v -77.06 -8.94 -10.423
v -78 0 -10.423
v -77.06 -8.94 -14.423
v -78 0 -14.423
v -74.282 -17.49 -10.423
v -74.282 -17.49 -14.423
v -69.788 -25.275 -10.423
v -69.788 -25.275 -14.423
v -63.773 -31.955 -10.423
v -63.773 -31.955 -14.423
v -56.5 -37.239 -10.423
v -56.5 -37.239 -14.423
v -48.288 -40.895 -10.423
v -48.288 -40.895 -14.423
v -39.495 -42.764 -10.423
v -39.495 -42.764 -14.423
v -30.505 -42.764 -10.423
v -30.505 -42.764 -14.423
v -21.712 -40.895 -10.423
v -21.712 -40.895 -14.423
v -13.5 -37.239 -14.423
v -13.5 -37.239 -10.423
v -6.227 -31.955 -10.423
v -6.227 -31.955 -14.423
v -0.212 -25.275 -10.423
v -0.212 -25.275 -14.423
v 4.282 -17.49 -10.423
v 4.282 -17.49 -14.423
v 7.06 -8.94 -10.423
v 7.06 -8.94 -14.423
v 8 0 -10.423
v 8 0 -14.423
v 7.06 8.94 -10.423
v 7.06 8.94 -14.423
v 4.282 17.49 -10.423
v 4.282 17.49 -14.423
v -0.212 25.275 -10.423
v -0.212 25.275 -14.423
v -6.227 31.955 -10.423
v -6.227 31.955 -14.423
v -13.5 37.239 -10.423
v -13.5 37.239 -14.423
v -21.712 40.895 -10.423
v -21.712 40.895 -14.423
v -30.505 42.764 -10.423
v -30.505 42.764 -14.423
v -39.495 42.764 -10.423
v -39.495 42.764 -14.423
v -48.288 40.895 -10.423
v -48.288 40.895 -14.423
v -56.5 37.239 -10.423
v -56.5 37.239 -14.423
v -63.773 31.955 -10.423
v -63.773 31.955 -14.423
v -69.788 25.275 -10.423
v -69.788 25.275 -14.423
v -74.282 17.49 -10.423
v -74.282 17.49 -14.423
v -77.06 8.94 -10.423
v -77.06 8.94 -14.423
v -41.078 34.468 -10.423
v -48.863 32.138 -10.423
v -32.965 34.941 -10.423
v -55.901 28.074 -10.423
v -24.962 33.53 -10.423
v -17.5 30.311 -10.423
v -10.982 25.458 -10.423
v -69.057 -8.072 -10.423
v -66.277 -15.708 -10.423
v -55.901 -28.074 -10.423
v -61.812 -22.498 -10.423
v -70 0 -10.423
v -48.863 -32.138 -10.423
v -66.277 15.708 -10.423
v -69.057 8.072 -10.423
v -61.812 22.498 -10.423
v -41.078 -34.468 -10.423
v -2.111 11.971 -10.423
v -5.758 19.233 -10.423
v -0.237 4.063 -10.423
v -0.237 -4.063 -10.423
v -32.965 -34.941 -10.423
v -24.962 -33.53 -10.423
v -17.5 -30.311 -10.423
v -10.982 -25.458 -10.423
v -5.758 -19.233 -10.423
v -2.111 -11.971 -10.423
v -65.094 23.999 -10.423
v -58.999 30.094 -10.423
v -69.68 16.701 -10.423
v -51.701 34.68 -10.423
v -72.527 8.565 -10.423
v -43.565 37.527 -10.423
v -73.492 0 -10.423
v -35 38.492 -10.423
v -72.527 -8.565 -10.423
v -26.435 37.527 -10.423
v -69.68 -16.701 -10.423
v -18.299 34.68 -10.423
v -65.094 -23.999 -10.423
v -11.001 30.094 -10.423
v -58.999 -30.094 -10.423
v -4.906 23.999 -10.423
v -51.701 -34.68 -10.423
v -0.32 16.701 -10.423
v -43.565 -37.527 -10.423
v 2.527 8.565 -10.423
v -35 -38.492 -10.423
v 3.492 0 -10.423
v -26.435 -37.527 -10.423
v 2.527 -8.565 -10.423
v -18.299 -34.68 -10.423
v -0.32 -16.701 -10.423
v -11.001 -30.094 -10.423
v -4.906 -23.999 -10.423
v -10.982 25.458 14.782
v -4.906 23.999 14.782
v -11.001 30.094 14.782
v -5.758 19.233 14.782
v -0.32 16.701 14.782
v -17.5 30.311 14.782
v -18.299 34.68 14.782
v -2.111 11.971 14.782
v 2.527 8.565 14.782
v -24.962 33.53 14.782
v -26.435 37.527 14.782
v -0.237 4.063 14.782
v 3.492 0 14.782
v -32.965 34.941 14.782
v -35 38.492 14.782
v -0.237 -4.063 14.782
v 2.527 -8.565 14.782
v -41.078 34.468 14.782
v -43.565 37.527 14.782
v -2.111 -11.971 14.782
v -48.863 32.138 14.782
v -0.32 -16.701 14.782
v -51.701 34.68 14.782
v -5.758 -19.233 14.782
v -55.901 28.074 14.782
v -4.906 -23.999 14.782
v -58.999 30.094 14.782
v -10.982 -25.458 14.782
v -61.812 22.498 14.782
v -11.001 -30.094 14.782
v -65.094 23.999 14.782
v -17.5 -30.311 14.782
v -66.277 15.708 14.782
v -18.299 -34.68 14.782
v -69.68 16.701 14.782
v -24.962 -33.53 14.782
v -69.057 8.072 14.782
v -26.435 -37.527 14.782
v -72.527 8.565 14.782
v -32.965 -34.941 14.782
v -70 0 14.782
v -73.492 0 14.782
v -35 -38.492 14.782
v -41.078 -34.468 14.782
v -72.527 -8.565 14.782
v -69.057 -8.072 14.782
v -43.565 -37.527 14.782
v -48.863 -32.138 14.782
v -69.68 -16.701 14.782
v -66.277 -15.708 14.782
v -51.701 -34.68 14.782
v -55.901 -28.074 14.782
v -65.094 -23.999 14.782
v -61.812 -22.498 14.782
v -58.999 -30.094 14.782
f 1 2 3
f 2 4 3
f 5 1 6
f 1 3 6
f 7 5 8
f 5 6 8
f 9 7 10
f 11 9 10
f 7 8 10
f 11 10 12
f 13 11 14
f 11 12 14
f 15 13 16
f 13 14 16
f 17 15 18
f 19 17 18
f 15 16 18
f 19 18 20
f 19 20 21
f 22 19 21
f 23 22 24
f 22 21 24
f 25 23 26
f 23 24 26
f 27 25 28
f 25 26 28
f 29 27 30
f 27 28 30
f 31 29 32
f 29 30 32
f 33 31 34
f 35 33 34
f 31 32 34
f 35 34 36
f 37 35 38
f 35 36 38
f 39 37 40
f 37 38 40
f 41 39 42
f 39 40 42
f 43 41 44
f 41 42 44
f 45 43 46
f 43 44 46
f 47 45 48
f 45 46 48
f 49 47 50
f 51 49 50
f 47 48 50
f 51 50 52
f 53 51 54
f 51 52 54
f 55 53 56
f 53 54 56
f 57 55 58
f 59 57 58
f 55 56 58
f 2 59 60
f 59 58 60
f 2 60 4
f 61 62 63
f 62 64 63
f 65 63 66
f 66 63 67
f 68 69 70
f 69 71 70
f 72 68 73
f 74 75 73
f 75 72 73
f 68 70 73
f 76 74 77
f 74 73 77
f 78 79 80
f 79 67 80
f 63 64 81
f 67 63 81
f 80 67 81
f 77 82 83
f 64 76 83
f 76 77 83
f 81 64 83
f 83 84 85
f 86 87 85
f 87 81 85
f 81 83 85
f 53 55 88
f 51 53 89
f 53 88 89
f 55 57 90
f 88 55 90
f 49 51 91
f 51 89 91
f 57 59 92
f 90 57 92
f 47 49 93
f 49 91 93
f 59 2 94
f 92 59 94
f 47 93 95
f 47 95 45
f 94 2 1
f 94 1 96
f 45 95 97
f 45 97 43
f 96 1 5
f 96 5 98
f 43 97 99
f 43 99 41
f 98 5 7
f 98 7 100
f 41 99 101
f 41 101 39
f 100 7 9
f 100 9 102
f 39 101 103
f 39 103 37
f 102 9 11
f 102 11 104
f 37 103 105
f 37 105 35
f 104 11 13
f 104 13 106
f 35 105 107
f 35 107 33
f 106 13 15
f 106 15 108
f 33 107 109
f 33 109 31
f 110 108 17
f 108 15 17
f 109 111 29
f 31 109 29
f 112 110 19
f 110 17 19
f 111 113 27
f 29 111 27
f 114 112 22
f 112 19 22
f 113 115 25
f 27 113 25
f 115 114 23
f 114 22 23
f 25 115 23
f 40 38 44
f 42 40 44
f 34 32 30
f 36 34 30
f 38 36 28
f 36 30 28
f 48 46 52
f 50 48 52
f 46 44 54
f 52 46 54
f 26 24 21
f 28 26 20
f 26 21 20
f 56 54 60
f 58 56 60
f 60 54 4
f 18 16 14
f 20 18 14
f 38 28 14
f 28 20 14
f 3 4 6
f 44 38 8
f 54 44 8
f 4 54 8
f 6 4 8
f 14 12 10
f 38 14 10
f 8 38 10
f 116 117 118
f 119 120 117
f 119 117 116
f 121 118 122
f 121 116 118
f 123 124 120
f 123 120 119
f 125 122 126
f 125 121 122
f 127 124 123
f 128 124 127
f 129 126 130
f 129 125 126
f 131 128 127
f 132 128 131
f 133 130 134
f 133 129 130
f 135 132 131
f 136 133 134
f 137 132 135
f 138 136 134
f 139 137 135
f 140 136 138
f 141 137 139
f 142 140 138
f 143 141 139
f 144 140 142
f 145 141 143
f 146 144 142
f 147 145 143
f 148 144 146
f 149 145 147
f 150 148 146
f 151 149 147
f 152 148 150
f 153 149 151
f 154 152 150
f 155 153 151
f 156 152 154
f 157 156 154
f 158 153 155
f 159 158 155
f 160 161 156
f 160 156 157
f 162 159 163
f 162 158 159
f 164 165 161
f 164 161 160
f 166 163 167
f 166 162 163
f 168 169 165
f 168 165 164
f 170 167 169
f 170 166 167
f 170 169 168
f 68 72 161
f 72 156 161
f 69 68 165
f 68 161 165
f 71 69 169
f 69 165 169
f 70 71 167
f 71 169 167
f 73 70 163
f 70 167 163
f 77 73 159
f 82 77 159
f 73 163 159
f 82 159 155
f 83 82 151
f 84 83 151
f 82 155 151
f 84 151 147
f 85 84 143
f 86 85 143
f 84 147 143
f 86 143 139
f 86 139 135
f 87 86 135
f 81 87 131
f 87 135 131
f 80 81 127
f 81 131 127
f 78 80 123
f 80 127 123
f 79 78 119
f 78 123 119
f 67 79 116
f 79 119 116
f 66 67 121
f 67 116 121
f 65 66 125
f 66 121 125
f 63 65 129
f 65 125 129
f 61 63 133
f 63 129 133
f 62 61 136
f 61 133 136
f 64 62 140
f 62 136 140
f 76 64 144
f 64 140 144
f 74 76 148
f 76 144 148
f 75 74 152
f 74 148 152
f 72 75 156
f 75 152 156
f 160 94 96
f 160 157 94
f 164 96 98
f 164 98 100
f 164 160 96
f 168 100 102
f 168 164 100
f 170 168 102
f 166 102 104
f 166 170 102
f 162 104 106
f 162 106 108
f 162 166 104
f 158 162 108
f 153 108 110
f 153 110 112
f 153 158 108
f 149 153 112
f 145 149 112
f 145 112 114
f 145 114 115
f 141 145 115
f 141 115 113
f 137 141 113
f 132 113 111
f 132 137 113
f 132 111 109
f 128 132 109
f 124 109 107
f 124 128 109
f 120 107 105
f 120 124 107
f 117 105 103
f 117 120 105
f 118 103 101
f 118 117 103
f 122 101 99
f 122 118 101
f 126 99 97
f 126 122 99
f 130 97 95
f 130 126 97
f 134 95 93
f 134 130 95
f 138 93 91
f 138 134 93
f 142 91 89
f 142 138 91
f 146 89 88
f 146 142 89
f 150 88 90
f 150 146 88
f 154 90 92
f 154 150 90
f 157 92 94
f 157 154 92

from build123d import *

# Parameters (mm, degrees)
F0_W   = 21.5
F0_H   = 4
F0_W_2 = 13.5
F0_W_3 = 3.492
F0_H_2 = 25.2048466533


# Not quite as in the source:
# - a feature names something its author has since deleted; it is built from what else it names


with BuildPart() as f1:
    # F0 (on Front) → F1 (revolve)
    with BuildSketch(Plane.XZ):
        with Locations((-59.25, -12.4232914925)):
            Rectangle(F0_W, F0_H)
        with Locations((-41.75, -12.4232914925)):
            Rectangle(F0_W_2, F0_H)
        with Locations((-71.746, 2.1791318342)):
            Rectangle(F0_W_3, F0_H_2)
        Polygon((-78, -14.4232914925), (-70, -14.4232914925), (-70, -10.4232914925), (-73.492, -10.4232914925), (-74, -10.4232914925), (-78, -10.4232914925), align=None)
    revolve(axis=Axis((-35, 0, -12.4232914925), (0, 0, 1)))


solid = f1.part
